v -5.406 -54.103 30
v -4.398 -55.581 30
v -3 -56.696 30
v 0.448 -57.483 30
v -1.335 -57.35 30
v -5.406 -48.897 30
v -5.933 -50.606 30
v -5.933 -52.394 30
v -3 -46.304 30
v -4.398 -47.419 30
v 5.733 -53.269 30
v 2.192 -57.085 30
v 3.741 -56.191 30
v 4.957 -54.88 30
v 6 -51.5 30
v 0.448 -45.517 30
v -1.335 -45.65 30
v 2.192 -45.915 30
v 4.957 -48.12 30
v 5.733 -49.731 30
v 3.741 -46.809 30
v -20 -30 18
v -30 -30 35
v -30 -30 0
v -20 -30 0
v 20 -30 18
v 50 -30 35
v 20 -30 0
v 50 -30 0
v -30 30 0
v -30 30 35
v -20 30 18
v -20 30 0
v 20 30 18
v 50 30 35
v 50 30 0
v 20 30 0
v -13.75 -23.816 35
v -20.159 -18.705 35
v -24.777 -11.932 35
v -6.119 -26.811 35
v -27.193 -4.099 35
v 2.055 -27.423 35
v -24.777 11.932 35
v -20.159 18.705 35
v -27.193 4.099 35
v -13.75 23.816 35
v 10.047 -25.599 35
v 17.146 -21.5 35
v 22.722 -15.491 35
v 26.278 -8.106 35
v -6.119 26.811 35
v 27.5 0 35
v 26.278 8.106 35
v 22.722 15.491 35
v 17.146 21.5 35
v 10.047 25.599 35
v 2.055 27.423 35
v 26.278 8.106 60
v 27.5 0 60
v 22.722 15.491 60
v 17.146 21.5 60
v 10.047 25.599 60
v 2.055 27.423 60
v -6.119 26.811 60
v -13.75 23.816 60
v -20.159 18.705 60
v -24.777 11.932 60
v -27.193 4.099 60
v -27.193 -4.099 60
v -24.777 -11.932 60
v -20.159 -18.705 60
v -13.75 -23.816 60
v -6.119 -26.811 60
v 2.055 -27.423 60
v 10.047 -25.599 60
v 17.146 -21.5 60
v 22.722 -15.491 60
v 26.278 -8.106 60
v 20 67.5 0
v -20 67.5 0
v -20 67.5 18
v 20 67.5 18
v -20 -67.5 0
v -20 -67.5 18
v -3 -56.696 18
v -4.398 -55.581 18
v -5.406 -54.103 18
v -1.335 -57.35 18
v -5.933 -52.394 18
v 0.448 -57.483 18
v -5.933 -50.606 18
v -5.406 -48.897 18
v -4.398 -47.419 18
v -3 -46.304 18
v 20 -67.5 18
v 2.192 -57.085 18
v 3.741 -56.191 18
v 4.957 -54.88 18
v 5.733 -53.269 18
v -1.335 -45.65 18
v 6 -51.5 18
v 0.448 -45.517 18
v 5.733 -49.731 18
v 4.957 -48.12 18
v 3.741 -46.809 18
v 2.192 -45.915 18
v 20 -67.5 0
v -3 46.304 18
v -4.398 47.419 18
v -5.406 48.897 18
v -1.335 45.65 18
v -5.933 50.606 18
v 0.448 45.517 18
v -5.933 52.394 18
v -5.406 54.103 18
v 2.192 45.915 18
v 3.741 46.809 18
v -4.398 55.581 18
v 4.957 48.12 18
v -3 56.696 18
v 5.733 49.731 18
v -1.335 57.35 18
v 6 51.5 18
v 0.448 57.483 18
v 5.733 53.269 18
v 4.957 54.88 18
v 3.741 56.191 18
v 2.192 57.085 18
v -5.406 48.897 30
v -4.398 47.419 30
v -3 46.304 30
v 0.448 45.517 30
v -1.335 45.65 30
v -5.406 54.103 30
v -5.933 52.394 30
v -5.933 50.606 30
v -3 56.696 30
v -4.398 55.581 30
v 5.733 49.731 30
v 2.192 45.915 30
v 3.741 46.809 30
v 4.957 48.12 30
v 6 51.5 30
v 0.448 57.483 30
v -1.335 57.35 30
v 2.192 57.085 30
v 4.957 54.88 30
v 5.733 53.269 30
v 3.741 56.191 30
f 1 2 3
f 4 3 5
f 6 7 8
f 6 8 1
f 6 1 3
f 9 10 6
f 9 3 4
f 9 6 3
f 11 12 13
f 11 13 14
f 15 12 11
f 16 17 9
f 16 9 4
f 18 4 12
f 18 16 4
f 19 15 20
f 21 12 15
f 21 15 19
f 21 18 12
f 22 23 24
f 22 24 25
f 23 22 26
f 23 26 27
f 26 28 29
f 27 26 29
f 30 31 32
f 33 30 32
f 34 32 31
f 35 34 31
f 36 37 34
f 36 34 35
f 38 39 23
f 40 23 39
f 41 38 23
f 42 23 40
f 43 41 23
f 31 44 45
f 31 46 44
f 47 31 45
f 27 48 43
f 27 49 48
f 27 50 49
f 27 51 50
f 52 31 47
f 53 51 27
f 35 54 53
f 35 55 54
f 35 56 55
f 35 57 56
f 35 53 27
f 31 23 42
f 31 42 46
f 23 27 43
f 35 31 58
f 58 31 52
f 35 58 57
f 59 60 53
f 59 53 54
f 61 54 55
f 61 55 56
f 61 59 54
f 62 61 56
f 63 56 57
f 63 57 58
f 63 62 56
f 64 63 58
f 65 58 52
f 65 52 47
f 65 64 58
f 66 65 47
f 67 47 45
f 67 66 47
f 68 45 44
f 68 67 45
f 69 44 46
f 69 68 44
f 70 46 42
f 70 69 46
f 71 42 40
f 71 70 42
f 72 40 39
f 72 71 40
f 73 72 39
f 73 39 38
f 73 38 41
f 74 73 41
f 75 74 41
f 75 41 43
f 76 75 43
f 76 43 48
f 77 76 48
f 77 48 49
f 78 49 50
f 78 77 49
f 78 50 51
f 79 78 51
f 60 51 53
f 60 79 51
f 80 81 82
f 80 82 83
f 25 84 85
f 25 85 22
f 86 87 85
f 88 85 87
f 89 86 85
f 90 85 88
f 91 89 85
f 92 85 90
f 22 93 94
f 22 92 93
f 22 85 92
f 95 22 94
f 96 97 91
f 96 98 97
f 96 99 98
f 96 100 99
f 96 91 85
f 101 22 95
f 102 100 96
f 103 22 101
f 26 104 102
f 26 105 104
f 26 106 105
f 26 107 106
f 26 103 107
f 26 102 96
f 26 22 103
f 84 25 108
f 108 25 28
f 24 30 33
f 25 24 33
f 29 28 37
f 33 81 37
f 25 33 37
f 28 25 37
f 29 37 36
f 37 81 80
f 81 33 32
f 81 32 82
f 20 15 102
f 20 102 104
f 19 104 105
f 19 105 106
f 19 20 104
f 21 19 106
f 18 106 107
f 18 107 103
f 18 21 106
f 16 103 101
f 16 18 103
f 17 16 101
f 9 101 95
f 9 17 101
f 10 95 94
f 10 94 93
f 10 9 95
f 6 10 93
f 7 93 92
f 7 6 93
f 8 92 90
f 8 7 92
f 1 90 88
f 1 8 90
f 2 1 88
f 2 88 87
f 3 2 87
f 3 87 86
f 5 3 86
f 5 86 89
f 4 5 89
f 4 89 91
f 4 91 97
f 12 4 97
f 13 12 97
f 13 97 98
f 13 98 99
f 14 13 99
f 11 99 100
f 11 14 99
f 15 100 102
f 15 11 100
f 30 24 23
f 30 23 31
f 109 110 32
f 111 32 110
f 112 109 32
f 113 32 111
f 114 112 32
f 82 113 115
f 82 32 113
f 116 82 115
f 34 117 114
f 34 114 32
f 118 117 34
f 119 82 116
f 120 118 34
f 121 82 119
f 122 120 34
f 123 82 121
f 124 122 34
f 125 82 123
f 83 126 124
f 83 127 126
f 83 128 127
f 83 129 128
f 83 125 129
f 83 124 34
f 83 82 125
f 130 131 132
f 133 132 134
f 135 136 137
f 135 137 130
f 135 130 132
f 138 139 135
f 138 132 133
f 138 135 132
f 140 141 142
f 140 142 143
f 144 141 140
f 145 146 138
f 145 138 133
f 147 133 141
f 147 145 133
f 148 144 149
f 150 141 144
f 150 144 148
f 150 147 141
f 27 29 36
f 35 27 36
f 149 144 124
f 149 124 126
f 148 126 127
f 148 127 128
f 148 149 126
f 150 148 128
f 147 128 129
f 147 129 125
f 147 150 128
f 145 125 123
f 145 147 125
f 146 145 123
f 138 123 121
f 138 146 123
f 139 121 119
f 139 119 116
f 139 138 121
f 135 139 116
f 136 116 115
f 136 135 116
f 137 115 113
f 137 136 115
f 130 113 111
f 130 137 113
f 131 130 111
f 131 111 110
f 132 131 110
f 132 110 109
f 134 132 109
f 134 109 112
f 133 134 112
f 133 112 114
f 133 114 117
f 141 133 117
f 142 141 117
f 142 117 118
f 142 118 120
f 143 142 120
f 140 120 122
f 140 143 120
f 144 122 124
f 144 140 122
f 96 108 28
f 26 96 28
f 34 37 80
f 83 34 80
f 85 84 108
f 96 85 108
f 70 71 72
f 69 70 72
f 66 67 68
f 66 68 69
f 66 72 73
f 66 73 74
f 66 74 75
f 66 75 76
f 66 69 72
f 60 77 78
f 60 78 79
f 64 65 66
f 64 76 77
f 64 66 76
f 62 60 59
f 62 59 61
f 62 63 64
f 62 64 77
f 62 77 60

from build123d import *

# Parameters (mm, degrees)
F0_W     = 40
F0_H     = 135
F1_DEPTH = 30
F2_W     = 80
F2_H     = 60
F3_DEPTH = 60
F4_W     = 80
F4_H     = 60
F4_R     = 27.5
F5_DEPTH = 25
F6_W     = 50.039211
F6_H     = 42.056428
F6_R     = 6
F7_DEPTH = 12


with BuildPart() as f1:
    # F0 (on Top) → F1 (new body)
    with BuildSketch(Plane.XY):
        Rectangle(F0_W, F0_H)
    extrude(amount=F1_DEPTH)

    # F2 (on Top) → F3 (join)
    with BuildSketch(Plane.XY):
        with Locations((10, 0)):
            Rectangle(F2_W, F2_H)
    extrude(amount=F3_DEPTH)

    # F4 (on face) → F5 (cut)
    with BuildSketch(Plane.XY.offset(60)):
        with Locations((10, 0)):
            Rectangle(F4_W, F4_H)
        Circle(F4_R, mode=Mode.SUBTRACT)
    extrude(amount=-F5_DEPTH, mode=Mode.SUBTRACT)

    # F6 (on face) → F7 (cut)
    with BuildSketch(Plane.XY.offset(30)):
        with Locations((-0.737083, 51.028214)):
            Rectangle(F6_W, F6_H)
        with Locations((0, 51.5)):
            Circle(F6_R, mode=Mode.SUBTRACT)
        with Locations((-0.737083, -51.028214)):
            Rectangle(F6_W, F6_H)
        with Locations((0, -51.5)):
            Circle(F6_R, mode=Mode.SUBTRACT)
    extrude(amount=-F7_DEPTH, mode=Mode.SUBTRACT)


solid = f1.part
